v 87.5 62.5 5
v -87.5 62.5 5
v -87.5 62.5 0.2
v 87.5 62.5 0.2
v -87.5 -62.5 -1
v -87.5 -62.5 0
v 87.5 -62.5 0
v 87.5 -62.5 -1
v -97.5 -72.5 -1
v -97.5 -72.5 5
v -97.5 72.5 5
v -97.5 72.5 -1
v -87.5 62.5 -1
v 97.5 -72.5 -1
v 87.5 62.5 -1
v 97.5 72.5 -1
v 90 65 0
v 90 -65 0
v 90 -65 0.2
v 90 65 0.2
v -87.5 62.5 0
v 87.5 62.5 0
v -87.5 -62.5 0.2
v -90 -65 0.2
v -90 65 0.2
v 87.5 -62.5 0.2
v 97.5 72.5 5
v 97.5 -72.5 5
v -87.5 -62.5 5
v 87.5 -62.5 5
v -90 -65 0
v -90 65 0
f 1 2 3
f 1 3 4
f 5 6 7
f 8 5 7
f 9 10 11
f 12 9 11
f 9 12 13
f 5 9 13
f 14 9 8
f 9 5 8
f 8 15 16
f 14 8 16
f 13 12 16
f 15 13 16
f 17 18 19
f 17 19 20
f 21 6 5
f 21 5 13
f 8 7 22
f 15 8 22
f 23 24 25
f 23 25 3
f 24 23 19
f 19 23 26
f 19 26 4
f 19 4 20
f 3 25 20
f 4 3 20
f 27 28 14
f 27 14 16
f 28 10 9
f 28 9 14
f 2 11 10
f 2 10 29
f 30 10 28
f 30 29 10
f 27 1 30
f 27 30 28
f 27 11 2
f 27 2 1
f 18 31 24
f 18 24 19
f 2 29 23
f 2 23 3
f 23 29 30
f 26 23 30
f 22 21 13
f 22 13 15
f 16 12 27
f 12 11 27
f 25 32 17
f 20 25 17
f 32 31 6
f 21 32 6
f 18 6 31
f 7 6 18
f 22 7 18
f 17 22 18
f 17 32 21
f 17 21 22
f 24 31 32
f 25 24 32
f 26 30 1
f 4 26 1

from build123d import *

# Parameters (mm, degrees)
F0_W     = 195
F0_H     = 145
F0_W_2   = 180
F0_H_2   = 130
F0_W_3   = 175
F0_H_3   = 125
F1_DEPTH = 5
F2_DEPTH = 1
F3_DEPTH = 0.2


with BuildPart() as f1:
    # F0 (on Top) → F1 (new body)
    with BuildSketch(Plane.XY):
        Rectangle(F0_W, F0_H)
        Rectangle(F0_W_2, F0_H_2, mode=Mode.SUBTRACT)
        Rectangle(F0_W_2, F0_H_2)
        Rectangle(F0_W_3, F0_H_3, mode=Mode.SUBTRACT)
    extrude(amount=F1_DEPTH)

    # F0 (on Top) → F2 (join)
    with BuildSketch(Plane.XY):
        Rectangle(F0_W, F0_H)
        Rectangle(F0_W_2, F0_H_2, mode=Mode.SUBTRACT)
        Rectangle(F0_W_2, F0_H_2)
        Rectangle(F0_W_3, F0_H_3, mode=Mode.SUBTRACT)
    extrude(amount=-F2_DEPTH)

    # F0 (on Top) → F3 (cut)
    with BuildSketch(Plane.XY):
        Rectangle(F0_W_2, F0_H_2)
        Rectangle(F0_W_3, F0_H_3, mode=Mode.SUBTRACT)
    extrude(amount=F3_DEPTH, mode=Mode.SUBTRACT)


solid = f1.part
